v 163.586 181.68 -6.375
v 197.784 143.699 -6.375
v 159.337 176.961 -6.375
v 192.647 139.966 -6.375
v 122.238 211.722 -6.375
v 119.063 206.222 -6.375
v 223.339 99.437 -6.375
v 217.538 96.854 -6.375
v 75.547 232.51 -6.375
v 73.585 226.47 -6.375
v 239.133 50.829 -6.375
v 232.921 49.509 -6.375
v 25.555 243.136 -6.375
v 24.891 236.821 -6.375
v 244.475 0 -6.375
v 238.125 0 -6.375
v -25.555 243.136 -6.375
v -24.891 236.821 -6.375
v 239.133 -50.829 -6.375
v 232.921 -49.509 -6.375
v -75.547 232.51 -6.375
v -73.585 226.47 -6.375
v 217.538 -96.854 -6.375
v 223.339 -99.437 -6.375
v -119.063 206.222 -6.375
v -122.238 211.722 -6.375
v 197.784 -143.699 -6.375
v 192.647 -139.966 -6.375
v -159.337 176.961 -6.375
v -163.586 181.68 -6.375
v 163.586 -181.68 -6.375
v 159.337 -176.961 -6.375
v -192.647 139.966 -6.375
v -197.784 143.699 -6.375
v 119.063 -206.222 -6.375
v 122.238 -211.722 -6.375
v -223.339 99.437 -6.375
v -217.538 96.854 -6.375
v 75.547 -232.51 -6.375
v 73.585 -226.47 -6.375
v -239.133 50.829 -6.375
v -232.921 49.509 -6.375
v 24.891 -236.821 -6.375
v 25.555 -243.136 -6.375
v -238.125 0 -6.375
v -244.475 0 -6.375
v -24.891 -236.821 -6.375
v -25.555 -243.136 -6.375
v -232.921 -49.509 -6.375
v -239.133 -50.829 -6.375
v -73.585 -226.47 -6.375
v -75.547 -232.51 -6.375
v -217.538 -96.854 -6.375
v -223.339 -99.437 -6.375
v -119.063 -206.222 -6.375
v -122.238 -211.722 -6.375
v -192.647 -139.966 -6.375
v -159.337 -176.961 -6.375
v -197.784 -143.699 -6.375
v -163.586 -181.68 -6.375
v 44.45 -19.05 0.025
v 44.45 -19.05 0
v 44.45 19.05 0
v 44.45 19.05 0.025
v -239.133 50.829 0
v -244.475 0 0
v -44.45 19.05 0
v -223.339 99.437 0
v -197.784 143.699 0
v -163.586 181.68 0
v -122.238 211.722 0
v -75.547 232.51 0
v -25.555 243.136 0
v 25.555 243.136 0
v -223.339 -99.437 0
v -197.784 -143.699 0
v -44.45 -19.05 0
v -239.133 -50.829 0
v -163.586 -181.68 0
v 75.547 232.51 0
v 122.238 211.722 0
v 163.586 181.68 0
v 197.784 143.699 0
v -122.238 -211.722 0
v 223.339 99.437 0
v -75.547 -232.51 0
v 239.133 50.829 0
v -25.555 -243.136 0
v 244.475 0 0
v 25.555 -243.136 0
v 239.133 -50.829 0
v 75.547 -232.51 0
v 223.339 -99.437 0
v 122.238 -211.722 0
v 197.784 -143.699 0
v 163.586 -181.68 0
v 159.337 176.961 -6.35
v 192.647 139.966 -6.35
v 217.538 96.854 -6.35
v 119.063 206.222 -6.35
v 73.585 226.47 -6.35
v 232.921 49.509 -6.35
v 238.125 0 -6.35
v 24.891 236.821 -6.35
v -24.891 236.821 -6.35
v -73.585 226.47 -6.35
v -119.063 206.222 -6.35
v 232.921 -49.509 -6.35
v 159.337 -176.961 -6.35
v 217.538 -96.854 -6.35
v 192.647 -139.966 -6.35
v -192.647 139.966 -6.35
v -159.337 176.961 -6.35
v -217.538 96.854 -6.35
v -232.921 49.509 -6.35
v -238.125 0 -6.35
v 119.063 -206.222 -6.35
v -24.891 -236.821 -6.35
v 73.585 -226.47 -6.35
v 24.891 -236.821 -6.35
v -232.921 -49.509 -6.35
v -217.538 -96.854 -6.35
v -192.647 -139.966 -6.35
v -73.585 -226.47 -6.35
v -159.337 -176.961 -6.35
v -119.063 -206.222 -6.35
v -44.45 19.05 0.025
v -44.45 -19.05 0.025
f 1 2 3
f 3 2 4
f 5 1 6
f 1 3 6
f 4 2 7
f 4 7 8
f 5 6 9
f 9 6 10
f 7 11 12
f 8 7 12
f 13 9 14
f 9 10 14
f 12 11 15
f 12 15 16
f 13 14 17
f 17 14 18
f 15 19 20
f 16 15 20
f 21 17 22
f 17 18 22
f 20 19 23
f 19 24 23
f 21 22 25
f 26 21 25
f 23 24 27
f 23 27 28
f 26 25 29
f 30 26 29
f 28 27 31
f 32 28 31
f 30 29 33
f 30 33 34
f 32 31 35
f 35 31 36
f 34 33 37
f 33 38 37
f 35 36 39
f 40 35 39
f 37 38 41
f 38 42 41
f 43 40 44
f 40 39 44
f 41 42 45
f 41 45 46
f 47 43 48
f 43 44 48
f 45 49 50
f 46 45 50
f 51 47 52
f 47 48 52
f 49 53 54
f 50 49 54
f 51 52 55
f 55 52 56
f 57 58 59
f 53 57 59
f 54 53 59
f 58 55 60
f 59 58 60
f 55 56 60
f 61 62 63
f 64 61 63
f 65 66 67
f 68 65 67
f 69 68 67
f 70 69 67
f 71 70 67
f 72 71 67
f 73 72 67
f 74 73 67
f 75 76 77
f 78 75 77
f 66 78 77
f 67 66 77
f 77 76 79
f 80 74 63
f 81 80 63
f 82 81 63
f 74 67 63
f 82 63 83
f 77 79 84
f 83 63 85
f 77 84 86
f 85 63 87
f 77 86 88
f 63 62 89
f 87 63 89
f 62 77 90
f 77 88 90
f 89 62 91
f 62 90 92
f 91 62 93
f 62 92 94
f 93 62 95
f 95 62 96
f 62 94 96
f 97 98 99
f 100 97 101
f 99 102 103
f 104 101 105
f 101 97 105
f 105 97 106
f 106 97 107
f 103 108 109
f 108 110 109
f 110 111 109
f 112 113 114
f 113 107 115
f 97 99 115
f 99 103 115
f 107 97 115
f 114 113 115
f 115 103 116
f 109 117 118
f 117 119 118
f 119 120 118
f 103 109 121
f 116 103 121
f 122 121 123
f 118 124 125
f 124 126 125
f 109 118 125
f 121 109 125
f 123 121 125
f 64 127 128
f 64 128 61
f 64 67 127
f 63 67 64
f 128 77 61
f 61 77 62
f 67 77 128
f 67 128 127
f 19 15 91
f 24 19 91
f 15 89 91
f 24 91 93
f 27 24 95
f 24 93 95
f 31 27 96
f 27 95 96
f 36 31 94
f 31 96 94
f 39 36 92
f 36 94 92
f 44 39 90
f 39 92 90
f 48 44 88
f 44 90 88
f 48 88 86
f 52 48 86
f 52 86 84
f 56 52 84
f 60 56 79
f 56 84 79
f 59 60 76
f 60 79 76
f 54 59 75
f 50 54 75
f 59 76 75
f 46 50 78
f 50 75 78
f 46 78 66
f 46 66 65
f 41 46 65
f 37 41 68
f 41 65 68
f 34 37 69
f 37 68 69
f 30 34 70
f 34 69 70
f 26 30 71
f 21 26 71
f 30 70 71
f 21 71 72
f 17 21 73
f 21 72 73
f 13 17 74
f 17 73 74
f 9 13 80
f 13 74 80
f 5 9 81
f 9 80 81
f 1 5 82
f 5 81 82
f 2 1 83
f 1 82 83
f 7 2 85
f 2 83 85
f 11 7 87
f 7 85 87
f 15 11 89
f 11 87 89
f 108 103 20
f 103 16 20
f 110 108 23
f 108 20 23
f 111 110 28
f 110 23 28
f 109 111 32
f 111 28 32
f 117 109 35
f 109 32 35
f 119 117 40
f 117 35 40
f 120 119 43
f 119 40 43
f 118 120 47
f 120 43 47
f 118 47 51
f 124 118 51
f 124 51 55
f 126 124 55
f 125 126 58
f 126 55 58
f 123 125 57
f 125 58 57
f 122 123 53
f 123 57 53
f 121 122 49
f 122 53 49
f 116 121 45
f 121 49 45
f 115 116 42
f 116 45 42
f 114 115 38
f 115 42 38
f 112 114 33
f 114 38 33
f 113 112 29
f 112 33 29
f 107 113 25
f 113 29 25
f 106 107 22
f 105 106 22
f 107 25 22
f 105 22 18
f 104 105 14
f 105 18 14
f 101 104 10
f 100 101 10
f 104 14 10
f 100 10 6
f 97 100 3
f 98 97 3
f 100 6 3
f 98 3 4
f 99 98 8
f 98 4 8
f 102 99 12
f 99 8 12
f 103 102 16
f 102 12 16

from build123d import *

# Parameters (mm, degrees)
F2_W     = 88.9
F2_H     = 38.1
F3_DEPTH = 0.0254


with BuildPart() as f1:
    # F0 (on Front) → F1 (revolve)
    with BuildSketch(Plane.XZ):
        Polygon((244.475, 0), (0, 0), (0, -6.35), (238.125, -6.35), (238.125, -6.3754), (244.475, -6.3754), align=None)
    revolve(axis=Axis((0, 0, -42.829115), (0, 0, -1)))

    # F2 (on face) → F3 (join)
    with BuildSketch(Plane.XY):
        Rectangle(F2_W, F2_H)
    extrude(amount=F3_DEPTH)


solid = f1.part
